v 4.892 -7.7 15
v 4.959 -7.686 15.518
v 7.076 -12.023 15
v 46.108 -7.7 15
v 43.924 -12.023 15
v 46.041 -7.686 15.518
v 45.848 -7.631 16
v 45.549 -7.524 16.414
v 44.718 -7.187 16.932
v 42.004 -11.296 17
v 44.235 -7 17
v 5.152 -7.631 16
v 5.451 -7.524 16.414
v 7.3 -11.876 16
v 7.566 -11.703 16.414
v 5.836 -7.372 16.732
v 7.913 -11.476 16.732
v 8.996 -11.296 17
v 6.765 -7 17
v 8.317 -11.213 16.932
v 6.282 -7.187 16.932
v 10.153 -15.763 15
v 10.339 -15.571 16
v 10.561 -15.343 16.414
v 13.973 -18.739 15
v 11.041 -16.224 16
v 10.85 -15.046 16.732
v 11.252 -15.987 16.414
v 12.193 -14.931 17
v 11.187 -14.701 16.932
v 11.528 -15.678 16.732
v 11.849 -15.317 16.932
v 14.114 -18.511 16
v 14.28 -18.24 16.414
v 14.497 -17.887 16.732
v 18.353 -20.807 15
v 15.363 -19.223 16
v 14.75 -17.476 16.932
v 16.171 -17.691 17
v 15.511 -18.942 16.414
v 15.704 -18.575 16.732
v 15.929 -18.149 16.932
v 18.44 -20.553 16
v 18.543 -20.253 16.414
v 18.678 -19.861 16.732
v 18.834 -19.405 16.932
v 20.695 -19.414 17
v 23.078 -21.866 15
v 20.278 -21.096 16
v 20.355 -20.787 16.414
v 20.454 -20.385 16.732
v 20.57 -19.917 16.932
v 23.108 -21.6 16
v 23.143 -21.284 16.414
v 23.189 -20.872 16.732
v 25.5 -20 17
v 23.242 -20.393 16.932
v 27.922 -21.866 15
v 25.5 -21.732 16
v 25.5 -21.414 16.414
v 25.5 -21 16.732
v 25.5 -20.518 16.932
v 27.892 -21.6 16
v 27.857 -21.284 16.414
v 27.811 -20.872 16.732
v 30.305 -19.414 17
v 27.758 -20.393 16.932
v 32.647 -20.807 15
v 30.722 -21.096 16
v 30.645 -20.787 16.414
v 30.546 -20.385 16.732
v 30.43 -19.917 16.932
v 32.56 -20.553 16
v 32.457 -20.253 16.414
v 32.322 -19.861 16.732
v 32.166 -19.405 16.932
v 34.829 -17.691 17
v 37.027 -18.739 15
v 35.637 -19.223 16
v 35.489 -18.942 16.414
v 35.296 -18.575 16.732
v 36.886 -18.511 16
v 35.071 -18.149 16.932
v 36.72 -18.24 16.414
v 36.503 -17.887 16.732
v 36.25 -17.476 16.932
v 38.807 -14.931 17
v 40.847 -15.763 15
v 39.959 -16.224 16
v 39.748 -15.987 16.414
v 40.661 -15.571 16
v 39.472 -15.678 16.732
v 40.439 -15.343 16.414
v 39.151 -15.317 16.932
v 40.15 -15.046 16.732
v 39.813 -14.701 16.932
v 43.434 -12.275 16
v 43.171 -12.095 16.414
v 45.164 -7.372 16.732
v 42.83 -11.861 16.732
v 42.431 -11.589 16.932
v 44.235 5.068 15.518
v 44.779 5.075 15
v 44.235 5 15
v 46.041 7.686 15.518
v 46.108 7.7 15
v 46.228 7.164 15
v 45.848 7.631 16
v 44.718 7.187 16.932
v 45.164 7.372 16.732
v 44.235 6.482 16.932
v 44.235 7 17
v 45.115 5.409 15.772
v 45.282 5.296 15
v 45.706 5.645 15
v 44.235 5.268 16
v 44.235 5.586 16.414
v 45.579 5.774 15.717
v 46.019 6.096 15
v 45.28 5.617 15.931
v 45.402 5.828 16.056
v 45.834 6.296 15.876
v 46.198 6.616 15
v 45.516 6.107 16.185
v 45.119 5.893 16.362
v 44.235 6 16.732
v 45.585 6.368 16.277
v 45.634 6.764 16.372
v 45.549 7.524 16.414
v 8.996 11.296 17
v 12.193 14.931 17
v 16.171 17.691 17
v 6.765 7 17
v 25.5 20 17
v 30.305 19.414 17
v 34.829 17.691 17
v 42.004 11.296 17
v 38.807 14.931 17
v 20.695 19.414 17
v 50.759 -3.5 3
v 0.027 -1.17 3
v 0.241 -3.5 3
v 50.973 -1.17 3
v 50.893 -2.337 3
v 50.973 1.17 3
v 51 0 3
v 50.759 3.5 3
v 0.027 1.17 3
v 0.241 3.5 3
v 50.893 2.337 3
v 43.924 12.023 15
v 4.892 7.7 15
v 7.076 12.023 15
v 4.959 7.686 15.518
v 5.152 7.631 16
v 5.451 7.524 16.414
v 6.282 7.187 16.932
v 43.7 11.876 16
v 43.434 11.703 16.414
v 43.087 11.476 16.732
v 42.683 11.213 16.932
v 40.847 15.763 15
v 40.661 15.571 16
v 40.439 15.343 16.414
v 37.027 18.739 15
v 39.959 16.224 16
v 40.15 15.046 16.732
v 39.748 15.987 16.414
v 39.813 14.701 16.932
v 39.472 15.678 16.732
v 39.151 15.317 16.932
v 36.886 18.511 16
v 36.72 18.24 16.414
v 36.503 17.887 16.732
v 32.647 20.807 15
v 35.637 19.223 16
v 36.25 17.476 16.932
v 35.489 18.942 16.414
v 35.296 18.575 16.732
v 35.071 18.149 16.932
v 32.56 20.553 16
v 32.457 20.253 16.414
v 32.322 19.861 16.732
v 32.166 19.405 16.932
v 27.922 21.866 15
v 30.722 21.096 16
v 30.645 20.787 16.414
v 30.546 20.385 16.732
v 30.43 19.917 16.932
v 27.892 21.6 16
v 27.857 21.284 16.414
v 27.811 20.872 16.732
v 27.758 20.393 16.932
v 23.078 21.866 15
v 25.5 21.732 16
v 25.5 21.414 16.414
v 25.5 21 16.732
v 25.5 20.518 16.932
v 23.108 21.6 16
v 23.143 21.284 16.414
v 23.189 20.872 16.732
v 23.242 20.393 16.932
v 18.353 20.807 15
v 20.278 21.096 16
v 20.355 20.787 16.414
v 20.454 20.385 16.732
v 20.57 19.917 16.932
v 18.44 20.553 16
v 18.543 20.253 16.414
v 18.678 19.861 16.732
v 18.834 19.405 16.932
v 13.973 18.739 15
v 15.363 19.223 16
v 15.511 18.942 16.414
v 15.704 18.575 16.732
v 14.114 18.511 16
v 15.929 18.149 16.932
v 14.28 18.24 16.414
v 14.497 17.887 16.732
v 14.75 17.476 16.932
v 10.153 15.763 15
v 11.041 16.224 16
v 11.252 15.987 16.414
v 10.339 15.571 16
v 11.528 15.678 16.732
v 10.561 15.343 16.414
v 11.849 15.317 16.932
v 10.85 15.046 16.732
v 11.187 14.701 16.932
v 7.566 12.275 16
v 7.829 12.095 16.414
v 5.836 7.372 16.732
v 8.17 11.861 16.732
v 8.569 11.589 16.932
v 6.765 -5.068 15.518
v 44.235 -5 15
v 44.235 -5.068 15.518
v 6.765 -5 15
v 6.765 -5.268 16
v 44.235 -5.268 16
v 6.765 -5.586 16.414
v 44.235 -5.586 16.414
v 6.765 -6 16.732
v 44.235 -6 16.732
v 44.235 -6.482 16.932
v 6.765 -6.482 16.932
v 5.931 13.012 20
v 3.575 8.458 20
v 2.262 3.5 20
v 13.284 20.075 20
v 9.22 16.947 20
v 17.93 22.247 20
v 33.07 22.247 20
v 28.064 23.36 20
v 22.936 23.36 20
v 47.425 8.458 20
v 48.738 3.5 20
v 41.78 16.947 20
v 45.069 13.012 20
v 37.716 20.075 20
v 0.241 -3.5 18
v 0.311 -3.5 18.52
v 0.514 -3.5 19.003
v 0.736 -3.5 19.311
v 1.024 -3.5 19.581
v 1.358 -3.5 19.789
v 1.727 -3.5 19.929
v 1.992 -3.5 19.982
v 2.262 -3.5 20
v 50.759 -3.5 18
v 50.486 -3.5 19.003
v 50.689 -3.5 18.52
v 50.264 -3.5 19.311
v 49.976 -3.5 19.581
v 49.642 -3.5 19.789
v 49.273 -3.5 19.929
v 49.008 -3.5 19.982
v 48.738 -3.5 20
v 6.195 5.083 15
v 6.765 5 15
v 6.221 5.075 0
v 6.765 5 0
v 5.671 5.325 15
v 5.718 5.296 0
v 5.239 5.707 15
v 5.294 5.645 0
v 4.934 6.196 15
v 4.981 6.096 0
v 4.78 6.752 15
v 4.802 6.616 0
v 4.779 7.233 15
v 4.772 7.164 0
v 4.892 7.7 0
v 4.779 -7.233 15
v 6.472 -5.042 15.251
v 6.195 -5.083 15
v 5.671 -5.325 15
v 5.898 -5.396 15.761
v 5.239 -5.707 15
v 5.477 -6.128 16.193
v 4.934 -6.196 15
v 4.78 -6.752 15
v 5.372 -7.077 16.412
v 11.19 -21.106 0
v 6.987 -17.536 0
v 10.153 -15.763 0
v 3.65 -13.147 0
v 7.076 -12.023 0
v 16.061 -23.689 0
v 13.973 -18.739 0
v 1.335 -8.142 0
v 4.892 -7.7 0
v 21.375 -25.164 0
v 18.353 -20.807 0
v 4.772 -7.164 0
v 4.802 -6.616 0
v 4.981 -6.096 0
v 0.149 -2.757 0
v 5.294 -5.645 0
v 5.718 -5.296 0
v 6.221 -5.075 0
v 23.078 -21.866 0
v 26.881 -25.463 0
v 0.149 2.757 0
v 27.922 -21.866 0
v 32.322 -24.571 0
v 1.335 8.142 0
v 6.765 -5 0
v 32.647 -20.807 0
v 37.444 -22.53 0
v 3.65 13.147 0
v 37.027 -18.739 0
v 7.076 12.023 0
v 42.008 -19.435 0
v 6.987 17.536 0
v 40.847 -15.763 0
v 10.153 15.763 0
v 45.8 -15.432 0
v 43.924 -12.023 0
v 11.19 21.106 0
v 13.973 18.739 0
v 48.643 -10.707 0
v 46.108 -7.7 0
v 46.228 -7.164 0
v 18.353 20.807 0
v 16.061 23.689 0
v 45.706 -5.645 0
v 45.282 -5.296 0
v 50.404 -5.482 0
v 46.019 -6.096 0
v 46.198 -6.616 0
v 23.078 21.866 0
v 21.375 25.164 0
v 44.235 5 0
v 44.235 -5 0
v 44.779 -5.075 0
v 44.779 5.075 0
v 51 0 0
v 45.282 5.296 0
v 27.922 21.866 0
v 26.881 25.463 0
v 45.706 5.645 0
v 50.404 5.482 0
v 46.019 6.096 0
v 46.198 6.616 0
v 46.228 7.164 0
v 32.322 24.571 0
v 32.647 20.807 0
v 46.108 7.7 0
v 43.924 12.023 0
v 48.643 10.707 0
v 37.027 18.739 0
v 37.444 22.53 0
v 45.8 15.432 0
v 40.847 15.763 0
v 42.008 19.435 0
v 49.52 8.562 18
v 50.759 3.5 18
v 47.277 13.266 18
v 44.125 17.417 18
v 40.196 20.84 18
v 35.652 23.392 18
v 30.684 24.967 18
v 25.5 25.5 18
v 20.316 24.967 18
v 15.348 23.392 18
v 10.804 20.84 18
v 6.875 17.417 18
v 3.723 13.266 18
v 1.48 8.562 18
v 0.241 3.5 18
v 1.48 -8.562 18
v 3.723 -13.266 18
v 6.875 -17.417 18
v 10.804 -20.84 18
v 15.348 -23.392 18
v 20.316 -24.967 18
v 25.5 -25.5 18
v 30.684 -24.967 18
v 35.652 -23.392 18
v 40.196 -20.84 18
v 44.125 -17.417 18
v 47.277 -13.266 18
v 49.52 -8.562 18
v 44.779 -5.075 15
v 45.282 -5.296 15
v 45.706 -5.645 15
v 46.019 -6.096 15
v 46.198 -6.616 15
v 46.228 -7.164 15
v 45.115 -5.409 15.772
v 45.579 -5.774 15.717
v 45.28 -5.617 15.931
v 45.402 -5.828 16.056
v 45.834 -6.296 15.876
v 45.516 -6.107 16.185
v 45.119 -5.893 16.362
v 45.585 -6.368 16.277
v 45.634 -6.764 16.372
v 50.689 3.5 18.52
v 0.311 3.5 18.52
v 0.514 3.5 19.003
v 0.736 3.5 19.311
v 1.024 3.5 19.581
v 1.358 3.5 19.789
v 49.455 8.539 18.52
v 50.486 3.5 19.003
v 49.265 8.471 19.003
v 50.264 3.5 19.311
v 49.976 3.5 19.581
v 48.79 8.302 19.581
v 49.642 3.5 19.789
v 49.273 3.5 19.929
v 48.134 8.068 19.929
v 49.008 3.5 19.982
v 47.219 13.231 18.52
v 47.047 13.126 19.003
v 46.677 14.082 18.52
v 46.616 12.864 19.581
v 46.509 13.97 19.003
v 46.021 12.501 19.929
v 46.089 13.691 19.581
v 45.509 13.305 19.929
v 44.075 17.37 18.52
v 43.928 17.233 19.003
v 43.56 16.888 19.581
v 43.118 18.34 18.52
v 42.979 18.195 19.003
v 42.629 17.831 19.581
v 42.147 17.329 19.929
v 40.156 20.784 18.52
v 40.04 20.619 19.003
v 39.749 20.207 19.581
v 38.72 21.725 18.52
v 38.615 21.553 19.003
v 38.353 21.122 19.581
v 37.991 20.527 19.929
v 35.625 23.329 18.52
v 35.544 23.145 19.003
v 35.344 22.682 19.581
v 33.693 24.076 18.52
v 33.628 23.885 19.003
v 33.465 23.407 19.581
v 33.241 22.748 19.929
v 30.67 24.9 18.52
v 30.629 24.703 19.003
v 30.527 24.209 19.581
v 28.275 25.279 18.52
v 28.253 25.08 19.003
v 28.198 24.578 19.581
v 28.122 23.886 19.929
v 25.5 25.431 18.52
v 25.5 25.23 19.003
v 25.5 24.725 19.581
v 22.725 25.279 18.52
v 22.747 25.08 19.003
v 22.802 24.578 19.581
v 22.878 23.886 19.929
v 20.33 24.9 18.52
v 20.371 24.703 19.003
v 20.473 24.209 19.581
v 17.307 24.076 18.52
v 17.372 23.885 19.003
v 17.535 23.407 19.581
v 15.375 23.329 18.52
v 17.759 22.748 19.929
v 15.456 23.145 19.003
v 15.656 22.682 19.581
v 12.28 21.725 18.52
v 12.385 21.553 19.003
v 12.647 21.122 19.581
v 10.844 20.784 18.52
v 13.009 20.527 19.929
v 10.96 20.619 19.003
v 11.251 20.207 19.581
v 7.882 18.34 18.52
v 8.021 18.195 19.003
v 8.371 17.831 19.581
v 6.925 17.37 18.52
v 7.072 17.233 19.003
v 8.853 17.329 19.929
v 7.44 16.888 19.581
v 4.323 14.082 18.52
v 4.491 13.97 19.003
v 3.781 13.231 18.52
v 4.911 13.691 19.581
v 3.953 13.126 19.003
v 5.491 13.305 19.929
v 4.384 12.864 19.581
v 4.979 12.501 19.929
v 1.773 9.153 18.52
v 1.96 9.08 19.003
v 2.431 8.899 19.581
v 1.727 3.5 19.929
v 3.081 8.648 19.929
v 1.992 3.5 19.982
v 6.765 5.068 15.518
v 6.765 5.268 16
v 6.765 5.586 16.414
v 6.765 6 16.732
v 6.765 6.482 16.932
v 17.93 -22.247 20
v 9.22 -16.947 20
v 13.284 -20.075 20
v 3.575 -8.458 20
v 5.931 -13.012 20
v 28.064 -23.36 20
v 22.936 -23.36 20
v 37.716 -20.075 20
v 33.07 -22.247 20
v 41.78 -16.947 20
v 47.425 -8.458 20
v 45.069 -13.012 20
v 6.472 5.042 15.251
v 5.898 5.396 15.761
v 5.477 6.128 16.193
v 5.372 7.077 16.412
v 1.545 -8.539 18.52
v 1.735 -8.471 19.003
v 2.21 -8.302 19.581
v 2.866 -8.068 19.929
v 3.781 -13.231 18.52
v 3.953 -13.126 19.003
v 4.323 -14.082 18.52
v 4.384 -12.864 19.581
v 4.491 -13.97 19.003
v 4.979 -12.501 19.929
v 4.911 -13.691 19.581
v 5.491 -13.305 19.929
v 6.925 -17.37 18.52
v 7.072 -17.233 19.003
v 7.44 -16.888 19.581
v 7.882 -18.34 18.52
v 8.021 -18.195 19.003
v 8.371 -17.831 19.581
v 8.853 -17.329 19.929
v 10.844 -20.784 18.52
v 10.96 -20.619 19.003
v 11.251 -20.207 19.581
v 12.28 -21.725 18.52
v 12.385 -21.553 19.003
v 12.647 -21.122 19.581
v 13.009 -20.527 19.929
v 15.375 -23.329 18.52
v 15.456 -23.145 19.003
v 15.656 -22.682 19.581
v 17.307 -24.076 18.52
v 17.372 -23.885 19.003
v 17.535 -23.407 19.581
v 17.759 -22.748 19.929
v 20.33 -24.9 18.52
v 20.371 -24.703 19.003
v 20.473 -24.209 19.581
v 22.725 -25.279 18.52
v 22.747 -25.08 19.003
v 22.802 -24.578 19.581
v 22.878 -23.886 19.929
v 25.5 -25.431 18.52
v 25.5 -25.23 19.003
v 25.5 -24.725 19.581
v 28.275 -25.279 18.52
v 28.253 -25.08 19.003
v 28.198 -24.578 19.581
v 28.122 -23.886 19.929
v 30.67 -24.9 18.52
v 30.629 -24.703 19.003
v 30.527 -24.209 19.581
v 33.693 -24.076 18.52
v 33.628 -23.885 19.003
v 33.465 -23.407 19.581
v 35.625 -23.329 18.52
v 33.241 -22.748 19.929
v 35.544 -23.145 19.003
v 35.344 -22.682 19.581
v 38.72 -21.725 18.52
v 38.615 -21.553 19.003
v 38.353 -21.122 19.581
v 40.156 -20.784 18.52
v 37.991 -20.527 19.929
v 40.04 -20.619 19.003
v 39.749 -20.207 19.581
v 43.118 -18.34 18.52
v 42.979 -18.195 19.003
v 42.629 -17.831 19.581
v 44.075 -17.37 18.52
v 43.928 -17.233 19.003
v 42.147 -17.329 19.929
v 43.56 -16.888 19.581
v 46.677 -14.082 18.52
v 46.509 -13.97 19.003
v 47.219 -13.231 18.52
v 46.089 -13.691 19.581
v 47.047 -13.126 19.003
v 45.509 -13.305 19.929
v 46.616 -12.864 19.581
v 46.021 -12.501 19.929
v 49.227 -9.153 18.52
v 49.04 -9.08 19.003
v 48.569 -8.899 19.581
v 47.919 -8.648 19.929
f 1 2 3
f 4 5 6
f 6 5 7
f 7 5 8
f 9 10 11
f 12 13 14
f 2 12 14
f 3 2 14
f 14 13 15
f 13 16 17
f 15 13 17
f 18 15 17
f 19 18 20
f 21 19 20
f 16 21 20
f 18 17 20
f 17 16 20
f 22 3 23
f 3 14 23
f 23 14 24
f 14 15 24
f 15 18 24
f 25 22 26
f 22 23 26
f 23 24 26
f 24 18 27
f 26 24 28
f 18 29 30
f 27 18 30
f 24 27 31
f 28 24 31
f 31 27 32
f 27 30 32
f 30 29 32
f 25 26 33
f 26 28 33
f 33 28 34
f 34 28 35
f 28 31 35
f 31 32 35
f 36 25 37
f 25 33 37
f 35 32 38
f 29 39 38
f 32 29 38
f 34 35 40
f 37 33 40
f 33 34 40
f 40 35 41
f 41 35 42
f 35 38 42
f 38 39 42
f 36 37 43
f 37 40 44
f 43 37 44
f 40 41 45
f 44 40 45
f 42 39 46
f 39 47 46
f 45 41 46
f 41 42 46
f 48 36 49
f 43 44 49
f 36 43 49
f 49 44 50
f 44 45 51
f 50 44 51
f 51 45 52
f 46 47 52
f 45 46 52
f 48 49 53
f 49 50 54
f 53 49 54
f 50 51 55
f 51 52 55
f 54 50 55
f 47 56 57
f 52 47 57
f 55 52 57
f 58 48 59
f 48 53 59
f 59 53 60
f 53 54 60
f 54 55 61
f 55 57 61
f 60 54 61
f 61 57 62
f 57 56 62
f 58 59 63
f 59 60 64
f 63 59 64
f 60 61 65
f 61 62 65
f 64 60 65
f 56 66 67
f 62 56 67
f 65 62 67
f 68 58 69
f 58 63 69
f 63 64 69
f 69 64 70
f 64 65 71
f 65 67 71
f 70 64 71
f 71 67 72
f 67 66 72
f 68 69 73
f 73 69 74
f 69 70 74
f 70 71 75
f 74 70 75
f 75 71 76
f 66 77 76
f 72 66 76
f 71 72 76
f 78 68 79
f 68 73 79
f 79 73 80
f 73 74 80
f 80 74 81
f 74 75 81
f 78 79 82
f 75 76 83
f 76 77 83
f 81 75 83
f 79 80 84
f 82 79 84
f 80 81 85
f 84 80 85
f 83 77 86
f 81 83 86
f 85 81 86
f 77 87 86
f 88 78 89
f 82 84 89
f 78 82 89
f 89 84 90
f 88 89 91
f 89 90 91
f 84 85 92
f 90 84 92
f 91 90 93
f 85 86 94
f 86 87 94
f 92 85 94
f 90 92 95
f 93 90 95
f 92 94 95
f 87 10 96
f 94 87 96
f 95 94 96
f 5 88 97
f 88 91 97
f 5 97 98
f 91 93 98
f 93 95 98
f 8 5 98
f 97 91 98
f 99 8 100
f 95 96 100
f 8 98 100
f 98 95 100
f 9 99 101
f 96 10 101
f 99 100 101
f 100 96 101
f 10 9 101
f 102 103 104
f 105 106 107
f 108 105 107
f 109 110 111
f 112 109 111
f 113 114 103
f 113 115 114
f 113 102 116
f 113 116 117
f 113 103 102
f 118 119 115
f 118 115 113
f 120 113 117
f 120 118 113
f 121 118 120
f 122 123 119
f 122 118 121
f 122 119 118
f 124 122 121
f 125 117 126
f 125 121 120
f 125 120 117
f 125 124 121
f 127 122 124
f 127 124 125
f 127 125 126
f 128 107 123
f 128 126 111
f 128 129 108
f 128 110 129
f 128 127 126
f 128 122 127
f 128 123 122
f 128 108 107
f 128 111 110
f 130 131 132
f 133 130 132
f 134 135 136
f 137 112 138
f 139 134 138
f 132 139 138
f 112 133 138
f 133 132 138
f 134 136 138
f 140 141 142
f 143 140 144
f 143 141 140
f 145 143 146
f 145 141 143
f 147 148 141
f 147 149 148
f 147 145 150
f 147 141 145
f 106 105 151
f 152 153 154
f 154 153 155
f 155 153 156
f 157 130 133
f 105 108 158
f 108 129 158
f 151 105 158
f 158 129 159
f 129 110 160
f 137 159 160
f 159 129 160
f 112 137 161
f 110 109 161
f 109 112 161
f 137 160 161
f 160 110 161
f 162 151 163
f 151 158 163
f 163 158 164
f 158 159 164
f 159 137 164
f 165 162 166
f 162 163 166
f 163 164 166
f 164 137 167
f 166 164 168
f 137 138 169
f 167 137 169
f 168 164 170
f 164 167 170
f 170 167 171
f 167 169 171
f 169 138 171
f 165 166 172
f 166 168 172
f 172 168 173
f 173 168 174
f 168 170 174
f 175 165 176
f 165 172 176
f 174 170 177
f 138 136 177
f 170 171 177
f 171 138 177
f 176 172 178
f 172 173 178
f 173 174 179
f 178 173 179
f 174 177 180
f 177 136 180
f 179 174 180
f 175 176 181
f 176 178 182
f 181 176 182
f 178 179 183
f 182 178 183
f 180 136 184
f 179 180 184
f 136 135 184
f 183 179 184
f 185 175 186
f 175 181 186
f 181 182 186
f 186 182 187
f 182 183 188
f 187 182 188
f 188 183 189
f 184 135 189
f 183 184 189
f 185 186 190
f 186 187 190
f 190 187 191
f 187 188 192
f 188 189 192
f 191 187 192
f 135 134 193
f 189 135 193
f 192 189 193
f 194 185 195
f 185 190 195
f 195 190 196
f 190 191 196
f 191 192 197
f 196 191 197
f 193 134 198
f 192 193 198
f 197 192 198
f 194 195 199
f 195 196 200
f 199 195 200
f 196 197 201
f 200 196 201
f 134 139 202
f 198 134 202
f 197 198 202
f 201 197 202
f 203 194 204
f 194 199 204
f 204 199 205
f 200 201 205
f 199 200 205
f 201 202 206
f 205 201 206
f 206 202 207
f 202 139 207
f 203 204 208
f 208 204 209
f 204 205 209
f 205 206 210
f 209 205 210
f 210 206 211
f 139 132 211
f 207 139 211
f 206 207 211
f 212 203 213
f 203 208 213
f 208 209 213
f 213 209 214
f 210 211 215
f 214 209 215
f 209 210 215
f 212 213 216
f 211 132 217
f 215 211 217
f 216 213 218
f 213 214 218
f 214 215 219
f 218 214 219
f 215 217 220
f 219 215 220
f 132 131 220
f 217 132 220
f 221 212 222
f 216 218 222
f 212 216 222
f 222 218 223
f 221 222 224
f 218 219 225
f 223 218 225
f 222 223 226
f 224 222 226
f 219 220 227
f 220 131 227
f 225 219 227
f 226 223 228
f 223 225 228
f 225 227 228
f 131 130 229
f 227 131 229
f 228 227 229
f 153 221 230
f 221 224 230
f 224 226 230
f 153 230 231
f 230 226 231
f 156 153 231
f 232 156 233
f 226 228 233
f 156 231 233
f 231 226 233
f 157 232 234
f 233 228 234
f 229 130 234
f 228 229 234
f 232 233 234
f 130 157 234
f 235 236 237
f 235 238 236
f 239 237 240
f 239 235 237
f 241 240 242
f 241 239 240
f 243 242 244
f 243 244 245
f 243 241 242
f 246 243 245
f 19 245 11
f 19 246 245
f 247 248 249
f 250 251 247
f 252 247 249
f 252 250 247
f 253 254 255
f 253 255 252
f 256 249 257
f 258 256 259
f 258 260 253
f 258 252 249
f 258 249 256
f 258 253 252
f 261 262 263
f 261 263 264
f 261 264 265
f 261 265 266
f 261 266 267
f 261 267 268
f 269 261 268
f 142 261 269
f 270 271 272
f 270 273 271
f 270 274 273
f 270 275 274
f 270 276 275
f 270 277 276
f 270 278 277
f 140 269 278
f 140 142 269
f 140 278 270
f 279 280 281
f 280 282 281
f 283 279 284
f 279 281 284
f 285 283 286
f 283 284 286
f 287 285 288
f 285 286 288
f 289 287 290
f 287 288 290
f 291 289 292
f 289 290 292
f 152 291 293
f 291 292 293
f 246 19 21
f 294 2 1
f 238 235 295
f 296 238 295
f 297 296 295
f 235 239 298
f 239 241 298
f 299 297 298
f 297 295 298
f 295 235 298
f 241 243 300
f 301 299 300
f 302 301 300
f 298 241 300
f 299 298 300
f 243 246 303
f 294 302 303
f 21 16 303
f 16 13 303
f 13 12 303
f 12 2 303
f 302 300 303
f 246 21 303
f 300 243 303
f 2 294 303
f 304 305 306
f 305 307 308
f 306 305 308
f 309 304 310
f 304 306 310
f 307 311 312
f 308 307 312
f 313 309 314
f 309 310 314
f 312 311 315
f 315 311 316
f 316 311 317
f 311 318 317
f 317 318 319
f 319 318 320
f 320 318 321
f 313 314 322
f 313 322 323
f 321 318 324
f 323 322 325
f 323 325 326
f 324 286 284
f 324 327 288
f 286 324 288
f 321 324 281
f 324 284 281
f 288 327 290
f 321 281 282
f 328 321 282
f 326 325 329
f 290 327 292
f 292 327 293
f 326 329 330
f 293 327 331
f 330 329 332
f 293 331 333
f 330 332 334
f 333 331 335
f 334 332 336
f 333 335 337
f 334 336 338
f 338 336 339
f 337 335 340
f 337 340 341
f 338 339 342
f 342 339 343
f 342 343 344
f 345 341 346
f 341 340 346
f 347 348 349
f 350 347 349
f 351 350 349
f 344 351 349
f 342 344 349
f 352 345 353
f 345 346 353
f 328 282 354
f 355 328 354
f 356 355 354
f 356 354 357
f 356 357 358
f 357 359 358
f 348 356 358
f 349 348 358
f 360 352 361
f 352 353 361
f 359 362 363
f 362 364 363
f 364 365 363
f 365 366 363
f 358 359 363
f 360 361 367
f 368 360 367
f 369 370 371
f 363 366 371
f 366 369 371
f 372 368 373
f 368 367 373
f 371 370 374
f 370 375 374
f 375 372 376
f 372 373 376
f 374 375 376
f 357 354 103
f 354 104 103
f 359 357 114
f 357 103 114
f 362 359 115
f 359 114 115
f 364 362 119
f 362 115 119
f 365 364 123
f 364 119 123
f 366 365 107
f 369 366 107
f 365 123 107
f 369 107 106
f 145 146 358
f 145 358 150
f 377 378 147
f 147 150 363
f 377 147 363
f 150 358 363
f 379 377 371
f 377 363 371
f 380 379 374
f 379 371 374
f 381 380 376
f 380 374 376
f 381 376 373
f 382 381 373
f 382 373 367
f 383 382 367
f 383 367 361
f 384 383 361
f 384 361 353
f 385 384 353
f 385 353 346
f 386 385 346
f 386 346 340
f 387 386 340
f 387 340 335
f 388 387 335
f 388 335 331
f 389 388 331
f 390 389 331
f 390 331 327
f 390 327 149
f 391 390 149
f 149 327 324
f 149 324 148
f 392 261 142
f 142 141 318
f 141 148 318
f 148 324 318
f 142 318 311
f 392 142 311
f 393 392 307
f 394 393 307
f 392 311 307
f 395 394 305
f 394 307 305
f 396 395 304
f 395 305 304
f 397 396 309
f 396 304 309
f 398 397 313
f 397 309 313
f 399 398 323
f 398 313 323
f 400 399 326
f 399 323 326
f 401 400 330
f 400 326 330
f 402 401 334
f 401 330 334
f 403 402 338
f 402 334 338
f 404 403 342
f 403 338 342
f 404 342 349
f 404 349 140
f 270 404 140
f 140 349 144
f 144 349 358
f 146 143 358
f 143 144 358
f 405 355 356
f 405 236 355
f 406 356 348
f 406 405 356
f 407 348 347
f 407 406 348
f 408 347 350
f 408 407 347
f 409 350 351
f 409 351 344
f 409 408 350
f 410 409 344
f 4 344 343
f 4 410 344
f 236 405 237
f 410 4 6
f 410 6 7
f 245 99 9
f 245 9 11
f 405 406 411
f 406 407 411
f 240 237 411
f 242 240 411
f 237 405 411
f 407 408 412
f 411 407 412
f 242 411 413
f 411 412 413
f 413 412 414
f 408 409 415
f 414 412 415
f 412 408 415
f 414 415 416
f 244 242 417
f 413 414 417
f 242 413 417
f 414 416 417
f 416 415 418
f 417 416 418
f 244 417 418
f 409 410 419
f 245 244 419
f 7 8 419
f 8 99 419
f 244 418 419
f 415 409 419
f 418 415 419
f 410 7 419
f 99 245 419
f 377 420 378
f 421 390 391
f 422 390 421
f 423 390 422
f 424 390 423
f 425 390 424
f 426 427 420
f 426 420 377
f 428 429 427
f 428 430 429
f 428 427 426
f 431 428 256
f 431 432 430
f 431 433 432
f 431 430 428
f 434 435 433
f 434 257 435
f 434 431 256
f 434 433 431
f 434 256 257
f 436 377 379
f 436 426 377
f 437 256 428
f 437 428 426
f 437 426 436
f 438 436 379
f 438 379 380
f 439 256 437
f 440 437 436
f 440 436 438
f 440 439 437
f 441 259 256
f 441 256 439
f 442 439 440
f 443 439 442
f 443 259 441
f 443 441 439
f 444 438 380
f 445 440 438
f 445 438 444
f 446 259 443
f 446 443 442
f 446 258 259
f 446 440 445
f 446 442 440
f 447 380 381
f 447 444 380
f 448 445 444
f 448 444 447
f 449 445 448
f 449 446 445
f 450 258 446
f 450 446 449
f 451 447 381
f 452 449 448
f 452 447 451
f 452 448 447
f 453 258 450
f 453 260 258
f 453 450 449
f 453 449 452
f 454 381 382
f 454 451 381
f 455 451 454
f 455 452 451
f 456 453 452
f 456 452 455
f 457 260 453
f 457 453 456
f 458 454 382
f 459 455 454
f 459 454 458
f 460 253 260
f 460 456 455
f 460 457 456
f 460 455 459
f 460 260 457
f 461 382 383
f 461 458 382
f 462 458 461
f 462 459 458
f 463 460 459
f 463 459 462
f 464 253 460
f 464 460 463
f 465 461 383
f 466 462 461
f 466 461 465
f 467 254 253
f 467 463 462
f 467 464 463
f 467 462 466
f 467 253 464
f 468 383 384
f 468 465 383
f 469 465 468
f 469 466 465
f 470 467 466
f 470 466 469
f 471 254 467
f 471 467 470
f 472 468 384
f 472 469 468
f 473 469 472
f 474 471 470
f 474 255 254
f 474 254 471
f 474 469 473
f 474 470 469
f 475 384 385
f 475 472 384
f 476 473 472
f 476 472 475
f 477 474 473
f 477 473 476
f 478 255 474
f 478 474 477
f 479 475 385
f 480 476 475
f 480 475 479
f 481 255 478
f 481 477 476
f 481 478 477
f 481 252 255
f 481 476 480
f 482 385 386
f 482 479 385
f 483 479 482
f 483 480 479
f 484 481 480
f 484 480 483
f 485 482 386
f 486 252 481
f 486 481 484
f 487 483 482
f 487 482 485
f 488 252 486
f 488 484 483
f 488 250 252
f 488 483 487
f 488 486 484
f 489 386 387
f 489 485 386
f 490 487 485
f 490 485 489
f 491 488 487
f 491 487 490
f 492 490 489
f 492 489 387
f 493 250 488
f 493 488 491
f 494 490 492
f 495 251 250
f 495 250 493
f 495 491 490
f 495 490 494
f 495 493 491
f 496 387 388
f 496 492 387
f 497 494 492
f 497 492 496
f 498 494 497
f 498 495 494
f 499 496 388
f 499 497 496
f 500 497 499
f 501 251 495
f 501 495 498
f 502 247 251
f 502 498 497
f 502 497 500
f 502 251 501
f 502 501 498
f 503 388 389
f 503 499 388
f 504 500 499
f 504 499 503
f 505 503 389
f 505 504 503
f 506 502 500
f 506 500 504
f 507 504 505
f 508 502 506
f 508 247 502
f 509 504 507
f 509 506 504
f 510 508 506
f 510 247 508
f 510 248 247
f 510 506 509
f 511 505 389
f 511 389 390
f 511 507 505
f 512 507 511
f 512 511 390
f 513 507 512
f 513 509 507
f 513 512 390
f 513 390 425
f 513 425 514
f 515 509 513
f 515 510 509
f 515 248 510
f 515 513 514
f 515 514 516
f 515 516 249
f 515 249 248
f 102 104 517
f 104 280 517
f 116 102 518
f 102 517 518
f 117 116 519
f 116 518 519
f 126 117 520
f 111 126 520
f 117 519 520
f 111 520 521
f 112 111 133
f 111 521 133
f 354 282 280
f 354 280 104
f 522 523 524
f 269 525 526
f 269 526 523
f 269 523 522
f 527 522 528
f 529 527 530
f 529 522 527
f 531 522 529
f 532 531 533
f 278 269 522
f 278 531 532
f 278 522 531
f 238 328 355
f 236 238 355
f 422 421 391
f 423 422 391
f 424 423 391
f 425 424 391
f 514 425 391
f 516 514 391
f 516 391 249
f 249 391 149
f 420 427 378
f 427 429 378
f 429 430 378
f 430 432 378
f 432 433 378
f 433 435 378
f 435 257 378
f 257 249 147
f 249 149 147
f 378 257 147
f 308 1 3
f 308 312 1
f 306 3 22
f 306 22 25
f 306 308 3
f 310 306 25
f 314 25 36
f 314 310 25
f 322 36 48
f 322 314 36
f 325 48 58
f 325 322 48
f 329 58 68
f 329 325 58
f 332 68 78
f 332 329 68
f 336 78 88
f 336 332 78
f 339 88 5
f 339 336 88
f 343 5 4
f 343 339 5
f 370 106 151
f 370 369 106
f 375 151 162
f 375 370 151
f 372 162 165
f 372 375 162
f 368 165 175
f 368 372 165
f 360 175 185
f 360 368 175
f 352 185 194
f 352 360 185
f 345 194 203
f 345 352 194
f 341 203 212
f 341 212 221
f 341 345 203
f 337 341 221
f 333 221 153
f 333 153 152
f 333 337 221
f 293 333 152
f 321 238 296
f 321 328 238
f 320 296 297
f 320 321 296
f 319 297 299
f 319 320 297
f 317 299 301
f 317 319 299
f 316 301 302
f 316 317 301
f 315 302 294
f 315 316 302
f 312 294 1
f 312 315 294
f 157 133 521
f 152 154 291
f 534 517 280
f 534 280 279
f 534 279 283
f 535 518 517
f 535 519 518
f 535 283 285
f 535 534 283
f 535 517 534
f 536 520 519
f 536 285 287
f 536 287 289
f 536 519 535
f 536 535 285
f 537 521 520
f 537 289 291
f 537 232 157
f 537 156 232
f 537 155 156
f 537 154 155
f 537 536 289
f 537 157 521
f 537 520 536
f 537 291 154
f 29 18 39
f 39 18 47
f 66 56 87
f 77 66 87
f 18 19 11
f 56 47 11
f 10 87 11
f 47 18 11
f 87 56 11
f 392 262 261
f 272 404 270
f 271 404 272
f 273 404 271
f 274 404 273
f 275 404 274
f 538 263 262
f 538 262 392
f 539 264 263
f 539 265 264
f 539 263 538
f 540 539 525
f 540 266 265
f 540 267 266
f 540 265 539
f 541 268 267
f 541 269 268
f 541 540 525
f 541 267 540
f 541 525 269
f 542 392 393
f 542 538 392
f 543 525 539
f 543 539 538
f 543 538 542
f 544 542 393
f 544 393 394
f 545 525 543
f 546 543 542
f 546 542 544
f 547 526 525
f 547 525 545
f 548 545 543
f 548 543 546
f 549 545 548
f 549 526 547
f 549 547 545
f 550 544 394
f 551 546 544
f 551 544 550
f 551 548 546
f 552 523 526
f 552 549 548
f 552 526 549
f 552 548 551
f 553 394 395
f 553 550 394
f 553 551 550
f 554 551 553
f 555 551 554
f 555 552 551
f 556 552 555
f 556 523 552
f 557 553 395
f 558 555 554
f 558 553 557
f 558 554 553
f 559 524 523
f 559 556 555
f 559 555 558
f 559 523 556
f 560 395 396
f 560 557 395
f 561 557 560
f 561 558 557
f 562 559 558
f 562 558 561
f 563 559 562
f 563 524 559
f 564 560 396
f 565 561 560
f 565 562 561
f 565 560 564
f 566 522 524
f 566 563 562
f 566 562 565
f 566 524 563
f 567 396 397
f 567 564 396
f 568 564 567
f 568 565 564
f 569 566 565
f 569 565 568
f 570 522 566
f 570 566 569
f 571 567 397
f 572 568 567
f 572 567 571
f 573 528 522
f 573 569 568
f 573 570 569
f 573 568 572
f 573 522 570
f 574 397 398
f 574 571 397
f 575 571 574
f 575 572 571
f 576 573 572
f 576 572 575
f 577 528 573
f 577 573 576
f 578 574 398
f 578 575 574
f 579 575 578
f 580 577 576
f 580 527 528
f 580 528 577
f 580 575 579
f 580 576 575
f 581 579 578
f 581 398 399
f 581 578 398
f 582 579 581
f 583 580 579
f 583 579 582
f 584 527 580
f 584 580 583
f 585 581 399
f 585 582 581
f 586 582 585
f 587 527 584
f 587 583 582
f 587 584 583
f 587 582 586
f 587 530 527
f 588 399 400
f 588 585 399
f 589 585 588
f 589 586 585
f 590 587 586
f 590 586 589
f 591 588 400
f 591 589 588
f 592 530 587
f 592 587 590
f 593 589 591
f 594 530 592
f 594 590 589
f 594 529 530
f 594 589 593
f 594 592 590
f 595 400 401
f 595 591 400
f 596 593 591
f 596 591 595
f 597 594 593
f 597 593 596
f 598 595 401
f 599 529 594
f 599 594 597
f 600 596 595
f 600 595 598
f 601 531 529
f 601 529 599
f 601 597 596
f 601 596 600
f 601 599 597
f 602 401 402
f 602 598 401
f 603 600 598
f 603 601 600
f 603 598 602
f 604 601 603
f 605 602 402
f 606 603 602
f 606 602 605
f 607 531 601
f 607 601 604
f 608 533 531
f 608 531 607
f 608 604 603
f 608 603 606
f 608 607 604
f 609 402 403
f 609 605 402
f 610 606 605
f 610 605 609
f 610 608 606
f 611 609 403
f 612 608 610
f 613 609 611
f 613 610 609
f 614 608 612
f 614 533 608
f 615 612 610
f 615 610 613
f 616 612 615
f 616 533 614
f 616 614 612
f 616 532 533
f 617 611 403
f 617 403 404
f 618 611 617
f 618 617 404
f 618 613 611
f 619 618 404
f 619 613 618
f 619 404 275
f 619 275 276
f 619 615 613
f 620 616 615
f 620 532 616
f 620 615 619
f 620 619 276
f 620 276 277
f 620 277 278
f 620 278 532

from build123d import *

# Parameters (mm, degrees)
SKETCH004_W  = 140.699818
SKETCH004_H  = 7
PAD007_DEPTH = 17
SKETCH006_W  = 100
SKETCH006_H  = 10
PAD005_DEPTH = 20
SKETCH005_R  = 22
PAD006_DEPTH = 17
SKETCH007_R  = 25.5
PAD004_DEPTH = 20
FILLET014_R  = 2
FILLET015_R  = 2
FILLET016_R  = 2
FILLET017_R  = 2
FILLET018_R  = 2
FILLET019_R  = 2


with BuildPart() as body007:
    # Sketch004 → Pad007 (new body)
    with BuildSketch(Plane.XY):
        with Locations((8.122221, 0)):
            Rectangle(SKETCH004_W, SKETCH004_H)
    extrude(amount=PAD007_DEPTH)


with BuildPart() as body007_1:
    # Body007 placement: moved
    add(body007.part.moved(Location((0, 0, 3))))


with BuildPart() as body004:
    # Sketch006 → Pad005 (new body)
    with BuildSketch(Plane.XY):
        Rectangle(SKETCH006_W, SKETCH006_H)
    extrude(amount=PAD005_DEPTH)


with BuildPart() as cut001:
    # Sketch005 → Pad006 (new body)
    with BuildSketch(Plane.XY):
        Circle(SKETCH005_R)
    extrude(amount=PAD006_DEPTH)

    # Cut001: cut Body004
    add(body004.part, mode=Mode.SUBTRACT)


with BuildPart() as fillet019:
    # Sketch007 → Pad004 (new body)
    with BuildSketch(Plane.XY):
        Circle(SKETCH007_R)
    extrude(amount=PAD004_DEPTH)

    # Cut002: cut Cut001
    add(cut001.part, mode=Mode.SUBTRACT)

    # Cut003: cut Body007
    add(body007_1.part, mode=Mode.SUBTRACT)


with BuildPart() as fillet019_1:
    # Cut003 placement: moved
    add(fillet019.part.moved(Location((25.5, 0, 0))))

    # Fillet014
    fillet014_edges = [fillet019_1.edges().sort_by_distance(p)[0] for p in [
        (25.5, -25.5, 20),
    ]]
    fillet(fillet014_edges, radius=FILLET014_R)

    # Fillet015
    fillet015_edges = [fillet019_1.edges().sort_by_distance(p)[0] for p in [
        (25.5, 25.5, 20),
    ]]
    fillet(fillet015_edges, radius=FILLET015_R)

    # Fillet016
    fillet016_edges = [fillet019_1.edges().sort_by_distance(p)[0] for p in [
        (25.5, -22, 17),
    ]]
    fillet(fillet016_edges, radius=FILLET016_R)

    # Fillet017
    fillet017_edges = [fillet019_1.edges().sort_by_distance(p)[0] for p in [
        (25.5, 22, 17),
    ]]
    fillet(fillet017_edges, radius=FILLET017_R)

    # Fillet018
    fillet018_edges = [fillet019_1.edges().sort_by_distance(p)[0] for p in [
        (25.5, -5, 17),
    ]]
    fillet(fillet018_edges, radius=FILLET018_R)

    # Fillet019
    fillet019_edges = [fillet019_1.edges().sort_by_distance(p)[0] for p in [
        (25.5, 5, 17),
    ]]
    fillet(fillet019_edges, radius=FILLET019_R)


solid = fillet019_1.part
